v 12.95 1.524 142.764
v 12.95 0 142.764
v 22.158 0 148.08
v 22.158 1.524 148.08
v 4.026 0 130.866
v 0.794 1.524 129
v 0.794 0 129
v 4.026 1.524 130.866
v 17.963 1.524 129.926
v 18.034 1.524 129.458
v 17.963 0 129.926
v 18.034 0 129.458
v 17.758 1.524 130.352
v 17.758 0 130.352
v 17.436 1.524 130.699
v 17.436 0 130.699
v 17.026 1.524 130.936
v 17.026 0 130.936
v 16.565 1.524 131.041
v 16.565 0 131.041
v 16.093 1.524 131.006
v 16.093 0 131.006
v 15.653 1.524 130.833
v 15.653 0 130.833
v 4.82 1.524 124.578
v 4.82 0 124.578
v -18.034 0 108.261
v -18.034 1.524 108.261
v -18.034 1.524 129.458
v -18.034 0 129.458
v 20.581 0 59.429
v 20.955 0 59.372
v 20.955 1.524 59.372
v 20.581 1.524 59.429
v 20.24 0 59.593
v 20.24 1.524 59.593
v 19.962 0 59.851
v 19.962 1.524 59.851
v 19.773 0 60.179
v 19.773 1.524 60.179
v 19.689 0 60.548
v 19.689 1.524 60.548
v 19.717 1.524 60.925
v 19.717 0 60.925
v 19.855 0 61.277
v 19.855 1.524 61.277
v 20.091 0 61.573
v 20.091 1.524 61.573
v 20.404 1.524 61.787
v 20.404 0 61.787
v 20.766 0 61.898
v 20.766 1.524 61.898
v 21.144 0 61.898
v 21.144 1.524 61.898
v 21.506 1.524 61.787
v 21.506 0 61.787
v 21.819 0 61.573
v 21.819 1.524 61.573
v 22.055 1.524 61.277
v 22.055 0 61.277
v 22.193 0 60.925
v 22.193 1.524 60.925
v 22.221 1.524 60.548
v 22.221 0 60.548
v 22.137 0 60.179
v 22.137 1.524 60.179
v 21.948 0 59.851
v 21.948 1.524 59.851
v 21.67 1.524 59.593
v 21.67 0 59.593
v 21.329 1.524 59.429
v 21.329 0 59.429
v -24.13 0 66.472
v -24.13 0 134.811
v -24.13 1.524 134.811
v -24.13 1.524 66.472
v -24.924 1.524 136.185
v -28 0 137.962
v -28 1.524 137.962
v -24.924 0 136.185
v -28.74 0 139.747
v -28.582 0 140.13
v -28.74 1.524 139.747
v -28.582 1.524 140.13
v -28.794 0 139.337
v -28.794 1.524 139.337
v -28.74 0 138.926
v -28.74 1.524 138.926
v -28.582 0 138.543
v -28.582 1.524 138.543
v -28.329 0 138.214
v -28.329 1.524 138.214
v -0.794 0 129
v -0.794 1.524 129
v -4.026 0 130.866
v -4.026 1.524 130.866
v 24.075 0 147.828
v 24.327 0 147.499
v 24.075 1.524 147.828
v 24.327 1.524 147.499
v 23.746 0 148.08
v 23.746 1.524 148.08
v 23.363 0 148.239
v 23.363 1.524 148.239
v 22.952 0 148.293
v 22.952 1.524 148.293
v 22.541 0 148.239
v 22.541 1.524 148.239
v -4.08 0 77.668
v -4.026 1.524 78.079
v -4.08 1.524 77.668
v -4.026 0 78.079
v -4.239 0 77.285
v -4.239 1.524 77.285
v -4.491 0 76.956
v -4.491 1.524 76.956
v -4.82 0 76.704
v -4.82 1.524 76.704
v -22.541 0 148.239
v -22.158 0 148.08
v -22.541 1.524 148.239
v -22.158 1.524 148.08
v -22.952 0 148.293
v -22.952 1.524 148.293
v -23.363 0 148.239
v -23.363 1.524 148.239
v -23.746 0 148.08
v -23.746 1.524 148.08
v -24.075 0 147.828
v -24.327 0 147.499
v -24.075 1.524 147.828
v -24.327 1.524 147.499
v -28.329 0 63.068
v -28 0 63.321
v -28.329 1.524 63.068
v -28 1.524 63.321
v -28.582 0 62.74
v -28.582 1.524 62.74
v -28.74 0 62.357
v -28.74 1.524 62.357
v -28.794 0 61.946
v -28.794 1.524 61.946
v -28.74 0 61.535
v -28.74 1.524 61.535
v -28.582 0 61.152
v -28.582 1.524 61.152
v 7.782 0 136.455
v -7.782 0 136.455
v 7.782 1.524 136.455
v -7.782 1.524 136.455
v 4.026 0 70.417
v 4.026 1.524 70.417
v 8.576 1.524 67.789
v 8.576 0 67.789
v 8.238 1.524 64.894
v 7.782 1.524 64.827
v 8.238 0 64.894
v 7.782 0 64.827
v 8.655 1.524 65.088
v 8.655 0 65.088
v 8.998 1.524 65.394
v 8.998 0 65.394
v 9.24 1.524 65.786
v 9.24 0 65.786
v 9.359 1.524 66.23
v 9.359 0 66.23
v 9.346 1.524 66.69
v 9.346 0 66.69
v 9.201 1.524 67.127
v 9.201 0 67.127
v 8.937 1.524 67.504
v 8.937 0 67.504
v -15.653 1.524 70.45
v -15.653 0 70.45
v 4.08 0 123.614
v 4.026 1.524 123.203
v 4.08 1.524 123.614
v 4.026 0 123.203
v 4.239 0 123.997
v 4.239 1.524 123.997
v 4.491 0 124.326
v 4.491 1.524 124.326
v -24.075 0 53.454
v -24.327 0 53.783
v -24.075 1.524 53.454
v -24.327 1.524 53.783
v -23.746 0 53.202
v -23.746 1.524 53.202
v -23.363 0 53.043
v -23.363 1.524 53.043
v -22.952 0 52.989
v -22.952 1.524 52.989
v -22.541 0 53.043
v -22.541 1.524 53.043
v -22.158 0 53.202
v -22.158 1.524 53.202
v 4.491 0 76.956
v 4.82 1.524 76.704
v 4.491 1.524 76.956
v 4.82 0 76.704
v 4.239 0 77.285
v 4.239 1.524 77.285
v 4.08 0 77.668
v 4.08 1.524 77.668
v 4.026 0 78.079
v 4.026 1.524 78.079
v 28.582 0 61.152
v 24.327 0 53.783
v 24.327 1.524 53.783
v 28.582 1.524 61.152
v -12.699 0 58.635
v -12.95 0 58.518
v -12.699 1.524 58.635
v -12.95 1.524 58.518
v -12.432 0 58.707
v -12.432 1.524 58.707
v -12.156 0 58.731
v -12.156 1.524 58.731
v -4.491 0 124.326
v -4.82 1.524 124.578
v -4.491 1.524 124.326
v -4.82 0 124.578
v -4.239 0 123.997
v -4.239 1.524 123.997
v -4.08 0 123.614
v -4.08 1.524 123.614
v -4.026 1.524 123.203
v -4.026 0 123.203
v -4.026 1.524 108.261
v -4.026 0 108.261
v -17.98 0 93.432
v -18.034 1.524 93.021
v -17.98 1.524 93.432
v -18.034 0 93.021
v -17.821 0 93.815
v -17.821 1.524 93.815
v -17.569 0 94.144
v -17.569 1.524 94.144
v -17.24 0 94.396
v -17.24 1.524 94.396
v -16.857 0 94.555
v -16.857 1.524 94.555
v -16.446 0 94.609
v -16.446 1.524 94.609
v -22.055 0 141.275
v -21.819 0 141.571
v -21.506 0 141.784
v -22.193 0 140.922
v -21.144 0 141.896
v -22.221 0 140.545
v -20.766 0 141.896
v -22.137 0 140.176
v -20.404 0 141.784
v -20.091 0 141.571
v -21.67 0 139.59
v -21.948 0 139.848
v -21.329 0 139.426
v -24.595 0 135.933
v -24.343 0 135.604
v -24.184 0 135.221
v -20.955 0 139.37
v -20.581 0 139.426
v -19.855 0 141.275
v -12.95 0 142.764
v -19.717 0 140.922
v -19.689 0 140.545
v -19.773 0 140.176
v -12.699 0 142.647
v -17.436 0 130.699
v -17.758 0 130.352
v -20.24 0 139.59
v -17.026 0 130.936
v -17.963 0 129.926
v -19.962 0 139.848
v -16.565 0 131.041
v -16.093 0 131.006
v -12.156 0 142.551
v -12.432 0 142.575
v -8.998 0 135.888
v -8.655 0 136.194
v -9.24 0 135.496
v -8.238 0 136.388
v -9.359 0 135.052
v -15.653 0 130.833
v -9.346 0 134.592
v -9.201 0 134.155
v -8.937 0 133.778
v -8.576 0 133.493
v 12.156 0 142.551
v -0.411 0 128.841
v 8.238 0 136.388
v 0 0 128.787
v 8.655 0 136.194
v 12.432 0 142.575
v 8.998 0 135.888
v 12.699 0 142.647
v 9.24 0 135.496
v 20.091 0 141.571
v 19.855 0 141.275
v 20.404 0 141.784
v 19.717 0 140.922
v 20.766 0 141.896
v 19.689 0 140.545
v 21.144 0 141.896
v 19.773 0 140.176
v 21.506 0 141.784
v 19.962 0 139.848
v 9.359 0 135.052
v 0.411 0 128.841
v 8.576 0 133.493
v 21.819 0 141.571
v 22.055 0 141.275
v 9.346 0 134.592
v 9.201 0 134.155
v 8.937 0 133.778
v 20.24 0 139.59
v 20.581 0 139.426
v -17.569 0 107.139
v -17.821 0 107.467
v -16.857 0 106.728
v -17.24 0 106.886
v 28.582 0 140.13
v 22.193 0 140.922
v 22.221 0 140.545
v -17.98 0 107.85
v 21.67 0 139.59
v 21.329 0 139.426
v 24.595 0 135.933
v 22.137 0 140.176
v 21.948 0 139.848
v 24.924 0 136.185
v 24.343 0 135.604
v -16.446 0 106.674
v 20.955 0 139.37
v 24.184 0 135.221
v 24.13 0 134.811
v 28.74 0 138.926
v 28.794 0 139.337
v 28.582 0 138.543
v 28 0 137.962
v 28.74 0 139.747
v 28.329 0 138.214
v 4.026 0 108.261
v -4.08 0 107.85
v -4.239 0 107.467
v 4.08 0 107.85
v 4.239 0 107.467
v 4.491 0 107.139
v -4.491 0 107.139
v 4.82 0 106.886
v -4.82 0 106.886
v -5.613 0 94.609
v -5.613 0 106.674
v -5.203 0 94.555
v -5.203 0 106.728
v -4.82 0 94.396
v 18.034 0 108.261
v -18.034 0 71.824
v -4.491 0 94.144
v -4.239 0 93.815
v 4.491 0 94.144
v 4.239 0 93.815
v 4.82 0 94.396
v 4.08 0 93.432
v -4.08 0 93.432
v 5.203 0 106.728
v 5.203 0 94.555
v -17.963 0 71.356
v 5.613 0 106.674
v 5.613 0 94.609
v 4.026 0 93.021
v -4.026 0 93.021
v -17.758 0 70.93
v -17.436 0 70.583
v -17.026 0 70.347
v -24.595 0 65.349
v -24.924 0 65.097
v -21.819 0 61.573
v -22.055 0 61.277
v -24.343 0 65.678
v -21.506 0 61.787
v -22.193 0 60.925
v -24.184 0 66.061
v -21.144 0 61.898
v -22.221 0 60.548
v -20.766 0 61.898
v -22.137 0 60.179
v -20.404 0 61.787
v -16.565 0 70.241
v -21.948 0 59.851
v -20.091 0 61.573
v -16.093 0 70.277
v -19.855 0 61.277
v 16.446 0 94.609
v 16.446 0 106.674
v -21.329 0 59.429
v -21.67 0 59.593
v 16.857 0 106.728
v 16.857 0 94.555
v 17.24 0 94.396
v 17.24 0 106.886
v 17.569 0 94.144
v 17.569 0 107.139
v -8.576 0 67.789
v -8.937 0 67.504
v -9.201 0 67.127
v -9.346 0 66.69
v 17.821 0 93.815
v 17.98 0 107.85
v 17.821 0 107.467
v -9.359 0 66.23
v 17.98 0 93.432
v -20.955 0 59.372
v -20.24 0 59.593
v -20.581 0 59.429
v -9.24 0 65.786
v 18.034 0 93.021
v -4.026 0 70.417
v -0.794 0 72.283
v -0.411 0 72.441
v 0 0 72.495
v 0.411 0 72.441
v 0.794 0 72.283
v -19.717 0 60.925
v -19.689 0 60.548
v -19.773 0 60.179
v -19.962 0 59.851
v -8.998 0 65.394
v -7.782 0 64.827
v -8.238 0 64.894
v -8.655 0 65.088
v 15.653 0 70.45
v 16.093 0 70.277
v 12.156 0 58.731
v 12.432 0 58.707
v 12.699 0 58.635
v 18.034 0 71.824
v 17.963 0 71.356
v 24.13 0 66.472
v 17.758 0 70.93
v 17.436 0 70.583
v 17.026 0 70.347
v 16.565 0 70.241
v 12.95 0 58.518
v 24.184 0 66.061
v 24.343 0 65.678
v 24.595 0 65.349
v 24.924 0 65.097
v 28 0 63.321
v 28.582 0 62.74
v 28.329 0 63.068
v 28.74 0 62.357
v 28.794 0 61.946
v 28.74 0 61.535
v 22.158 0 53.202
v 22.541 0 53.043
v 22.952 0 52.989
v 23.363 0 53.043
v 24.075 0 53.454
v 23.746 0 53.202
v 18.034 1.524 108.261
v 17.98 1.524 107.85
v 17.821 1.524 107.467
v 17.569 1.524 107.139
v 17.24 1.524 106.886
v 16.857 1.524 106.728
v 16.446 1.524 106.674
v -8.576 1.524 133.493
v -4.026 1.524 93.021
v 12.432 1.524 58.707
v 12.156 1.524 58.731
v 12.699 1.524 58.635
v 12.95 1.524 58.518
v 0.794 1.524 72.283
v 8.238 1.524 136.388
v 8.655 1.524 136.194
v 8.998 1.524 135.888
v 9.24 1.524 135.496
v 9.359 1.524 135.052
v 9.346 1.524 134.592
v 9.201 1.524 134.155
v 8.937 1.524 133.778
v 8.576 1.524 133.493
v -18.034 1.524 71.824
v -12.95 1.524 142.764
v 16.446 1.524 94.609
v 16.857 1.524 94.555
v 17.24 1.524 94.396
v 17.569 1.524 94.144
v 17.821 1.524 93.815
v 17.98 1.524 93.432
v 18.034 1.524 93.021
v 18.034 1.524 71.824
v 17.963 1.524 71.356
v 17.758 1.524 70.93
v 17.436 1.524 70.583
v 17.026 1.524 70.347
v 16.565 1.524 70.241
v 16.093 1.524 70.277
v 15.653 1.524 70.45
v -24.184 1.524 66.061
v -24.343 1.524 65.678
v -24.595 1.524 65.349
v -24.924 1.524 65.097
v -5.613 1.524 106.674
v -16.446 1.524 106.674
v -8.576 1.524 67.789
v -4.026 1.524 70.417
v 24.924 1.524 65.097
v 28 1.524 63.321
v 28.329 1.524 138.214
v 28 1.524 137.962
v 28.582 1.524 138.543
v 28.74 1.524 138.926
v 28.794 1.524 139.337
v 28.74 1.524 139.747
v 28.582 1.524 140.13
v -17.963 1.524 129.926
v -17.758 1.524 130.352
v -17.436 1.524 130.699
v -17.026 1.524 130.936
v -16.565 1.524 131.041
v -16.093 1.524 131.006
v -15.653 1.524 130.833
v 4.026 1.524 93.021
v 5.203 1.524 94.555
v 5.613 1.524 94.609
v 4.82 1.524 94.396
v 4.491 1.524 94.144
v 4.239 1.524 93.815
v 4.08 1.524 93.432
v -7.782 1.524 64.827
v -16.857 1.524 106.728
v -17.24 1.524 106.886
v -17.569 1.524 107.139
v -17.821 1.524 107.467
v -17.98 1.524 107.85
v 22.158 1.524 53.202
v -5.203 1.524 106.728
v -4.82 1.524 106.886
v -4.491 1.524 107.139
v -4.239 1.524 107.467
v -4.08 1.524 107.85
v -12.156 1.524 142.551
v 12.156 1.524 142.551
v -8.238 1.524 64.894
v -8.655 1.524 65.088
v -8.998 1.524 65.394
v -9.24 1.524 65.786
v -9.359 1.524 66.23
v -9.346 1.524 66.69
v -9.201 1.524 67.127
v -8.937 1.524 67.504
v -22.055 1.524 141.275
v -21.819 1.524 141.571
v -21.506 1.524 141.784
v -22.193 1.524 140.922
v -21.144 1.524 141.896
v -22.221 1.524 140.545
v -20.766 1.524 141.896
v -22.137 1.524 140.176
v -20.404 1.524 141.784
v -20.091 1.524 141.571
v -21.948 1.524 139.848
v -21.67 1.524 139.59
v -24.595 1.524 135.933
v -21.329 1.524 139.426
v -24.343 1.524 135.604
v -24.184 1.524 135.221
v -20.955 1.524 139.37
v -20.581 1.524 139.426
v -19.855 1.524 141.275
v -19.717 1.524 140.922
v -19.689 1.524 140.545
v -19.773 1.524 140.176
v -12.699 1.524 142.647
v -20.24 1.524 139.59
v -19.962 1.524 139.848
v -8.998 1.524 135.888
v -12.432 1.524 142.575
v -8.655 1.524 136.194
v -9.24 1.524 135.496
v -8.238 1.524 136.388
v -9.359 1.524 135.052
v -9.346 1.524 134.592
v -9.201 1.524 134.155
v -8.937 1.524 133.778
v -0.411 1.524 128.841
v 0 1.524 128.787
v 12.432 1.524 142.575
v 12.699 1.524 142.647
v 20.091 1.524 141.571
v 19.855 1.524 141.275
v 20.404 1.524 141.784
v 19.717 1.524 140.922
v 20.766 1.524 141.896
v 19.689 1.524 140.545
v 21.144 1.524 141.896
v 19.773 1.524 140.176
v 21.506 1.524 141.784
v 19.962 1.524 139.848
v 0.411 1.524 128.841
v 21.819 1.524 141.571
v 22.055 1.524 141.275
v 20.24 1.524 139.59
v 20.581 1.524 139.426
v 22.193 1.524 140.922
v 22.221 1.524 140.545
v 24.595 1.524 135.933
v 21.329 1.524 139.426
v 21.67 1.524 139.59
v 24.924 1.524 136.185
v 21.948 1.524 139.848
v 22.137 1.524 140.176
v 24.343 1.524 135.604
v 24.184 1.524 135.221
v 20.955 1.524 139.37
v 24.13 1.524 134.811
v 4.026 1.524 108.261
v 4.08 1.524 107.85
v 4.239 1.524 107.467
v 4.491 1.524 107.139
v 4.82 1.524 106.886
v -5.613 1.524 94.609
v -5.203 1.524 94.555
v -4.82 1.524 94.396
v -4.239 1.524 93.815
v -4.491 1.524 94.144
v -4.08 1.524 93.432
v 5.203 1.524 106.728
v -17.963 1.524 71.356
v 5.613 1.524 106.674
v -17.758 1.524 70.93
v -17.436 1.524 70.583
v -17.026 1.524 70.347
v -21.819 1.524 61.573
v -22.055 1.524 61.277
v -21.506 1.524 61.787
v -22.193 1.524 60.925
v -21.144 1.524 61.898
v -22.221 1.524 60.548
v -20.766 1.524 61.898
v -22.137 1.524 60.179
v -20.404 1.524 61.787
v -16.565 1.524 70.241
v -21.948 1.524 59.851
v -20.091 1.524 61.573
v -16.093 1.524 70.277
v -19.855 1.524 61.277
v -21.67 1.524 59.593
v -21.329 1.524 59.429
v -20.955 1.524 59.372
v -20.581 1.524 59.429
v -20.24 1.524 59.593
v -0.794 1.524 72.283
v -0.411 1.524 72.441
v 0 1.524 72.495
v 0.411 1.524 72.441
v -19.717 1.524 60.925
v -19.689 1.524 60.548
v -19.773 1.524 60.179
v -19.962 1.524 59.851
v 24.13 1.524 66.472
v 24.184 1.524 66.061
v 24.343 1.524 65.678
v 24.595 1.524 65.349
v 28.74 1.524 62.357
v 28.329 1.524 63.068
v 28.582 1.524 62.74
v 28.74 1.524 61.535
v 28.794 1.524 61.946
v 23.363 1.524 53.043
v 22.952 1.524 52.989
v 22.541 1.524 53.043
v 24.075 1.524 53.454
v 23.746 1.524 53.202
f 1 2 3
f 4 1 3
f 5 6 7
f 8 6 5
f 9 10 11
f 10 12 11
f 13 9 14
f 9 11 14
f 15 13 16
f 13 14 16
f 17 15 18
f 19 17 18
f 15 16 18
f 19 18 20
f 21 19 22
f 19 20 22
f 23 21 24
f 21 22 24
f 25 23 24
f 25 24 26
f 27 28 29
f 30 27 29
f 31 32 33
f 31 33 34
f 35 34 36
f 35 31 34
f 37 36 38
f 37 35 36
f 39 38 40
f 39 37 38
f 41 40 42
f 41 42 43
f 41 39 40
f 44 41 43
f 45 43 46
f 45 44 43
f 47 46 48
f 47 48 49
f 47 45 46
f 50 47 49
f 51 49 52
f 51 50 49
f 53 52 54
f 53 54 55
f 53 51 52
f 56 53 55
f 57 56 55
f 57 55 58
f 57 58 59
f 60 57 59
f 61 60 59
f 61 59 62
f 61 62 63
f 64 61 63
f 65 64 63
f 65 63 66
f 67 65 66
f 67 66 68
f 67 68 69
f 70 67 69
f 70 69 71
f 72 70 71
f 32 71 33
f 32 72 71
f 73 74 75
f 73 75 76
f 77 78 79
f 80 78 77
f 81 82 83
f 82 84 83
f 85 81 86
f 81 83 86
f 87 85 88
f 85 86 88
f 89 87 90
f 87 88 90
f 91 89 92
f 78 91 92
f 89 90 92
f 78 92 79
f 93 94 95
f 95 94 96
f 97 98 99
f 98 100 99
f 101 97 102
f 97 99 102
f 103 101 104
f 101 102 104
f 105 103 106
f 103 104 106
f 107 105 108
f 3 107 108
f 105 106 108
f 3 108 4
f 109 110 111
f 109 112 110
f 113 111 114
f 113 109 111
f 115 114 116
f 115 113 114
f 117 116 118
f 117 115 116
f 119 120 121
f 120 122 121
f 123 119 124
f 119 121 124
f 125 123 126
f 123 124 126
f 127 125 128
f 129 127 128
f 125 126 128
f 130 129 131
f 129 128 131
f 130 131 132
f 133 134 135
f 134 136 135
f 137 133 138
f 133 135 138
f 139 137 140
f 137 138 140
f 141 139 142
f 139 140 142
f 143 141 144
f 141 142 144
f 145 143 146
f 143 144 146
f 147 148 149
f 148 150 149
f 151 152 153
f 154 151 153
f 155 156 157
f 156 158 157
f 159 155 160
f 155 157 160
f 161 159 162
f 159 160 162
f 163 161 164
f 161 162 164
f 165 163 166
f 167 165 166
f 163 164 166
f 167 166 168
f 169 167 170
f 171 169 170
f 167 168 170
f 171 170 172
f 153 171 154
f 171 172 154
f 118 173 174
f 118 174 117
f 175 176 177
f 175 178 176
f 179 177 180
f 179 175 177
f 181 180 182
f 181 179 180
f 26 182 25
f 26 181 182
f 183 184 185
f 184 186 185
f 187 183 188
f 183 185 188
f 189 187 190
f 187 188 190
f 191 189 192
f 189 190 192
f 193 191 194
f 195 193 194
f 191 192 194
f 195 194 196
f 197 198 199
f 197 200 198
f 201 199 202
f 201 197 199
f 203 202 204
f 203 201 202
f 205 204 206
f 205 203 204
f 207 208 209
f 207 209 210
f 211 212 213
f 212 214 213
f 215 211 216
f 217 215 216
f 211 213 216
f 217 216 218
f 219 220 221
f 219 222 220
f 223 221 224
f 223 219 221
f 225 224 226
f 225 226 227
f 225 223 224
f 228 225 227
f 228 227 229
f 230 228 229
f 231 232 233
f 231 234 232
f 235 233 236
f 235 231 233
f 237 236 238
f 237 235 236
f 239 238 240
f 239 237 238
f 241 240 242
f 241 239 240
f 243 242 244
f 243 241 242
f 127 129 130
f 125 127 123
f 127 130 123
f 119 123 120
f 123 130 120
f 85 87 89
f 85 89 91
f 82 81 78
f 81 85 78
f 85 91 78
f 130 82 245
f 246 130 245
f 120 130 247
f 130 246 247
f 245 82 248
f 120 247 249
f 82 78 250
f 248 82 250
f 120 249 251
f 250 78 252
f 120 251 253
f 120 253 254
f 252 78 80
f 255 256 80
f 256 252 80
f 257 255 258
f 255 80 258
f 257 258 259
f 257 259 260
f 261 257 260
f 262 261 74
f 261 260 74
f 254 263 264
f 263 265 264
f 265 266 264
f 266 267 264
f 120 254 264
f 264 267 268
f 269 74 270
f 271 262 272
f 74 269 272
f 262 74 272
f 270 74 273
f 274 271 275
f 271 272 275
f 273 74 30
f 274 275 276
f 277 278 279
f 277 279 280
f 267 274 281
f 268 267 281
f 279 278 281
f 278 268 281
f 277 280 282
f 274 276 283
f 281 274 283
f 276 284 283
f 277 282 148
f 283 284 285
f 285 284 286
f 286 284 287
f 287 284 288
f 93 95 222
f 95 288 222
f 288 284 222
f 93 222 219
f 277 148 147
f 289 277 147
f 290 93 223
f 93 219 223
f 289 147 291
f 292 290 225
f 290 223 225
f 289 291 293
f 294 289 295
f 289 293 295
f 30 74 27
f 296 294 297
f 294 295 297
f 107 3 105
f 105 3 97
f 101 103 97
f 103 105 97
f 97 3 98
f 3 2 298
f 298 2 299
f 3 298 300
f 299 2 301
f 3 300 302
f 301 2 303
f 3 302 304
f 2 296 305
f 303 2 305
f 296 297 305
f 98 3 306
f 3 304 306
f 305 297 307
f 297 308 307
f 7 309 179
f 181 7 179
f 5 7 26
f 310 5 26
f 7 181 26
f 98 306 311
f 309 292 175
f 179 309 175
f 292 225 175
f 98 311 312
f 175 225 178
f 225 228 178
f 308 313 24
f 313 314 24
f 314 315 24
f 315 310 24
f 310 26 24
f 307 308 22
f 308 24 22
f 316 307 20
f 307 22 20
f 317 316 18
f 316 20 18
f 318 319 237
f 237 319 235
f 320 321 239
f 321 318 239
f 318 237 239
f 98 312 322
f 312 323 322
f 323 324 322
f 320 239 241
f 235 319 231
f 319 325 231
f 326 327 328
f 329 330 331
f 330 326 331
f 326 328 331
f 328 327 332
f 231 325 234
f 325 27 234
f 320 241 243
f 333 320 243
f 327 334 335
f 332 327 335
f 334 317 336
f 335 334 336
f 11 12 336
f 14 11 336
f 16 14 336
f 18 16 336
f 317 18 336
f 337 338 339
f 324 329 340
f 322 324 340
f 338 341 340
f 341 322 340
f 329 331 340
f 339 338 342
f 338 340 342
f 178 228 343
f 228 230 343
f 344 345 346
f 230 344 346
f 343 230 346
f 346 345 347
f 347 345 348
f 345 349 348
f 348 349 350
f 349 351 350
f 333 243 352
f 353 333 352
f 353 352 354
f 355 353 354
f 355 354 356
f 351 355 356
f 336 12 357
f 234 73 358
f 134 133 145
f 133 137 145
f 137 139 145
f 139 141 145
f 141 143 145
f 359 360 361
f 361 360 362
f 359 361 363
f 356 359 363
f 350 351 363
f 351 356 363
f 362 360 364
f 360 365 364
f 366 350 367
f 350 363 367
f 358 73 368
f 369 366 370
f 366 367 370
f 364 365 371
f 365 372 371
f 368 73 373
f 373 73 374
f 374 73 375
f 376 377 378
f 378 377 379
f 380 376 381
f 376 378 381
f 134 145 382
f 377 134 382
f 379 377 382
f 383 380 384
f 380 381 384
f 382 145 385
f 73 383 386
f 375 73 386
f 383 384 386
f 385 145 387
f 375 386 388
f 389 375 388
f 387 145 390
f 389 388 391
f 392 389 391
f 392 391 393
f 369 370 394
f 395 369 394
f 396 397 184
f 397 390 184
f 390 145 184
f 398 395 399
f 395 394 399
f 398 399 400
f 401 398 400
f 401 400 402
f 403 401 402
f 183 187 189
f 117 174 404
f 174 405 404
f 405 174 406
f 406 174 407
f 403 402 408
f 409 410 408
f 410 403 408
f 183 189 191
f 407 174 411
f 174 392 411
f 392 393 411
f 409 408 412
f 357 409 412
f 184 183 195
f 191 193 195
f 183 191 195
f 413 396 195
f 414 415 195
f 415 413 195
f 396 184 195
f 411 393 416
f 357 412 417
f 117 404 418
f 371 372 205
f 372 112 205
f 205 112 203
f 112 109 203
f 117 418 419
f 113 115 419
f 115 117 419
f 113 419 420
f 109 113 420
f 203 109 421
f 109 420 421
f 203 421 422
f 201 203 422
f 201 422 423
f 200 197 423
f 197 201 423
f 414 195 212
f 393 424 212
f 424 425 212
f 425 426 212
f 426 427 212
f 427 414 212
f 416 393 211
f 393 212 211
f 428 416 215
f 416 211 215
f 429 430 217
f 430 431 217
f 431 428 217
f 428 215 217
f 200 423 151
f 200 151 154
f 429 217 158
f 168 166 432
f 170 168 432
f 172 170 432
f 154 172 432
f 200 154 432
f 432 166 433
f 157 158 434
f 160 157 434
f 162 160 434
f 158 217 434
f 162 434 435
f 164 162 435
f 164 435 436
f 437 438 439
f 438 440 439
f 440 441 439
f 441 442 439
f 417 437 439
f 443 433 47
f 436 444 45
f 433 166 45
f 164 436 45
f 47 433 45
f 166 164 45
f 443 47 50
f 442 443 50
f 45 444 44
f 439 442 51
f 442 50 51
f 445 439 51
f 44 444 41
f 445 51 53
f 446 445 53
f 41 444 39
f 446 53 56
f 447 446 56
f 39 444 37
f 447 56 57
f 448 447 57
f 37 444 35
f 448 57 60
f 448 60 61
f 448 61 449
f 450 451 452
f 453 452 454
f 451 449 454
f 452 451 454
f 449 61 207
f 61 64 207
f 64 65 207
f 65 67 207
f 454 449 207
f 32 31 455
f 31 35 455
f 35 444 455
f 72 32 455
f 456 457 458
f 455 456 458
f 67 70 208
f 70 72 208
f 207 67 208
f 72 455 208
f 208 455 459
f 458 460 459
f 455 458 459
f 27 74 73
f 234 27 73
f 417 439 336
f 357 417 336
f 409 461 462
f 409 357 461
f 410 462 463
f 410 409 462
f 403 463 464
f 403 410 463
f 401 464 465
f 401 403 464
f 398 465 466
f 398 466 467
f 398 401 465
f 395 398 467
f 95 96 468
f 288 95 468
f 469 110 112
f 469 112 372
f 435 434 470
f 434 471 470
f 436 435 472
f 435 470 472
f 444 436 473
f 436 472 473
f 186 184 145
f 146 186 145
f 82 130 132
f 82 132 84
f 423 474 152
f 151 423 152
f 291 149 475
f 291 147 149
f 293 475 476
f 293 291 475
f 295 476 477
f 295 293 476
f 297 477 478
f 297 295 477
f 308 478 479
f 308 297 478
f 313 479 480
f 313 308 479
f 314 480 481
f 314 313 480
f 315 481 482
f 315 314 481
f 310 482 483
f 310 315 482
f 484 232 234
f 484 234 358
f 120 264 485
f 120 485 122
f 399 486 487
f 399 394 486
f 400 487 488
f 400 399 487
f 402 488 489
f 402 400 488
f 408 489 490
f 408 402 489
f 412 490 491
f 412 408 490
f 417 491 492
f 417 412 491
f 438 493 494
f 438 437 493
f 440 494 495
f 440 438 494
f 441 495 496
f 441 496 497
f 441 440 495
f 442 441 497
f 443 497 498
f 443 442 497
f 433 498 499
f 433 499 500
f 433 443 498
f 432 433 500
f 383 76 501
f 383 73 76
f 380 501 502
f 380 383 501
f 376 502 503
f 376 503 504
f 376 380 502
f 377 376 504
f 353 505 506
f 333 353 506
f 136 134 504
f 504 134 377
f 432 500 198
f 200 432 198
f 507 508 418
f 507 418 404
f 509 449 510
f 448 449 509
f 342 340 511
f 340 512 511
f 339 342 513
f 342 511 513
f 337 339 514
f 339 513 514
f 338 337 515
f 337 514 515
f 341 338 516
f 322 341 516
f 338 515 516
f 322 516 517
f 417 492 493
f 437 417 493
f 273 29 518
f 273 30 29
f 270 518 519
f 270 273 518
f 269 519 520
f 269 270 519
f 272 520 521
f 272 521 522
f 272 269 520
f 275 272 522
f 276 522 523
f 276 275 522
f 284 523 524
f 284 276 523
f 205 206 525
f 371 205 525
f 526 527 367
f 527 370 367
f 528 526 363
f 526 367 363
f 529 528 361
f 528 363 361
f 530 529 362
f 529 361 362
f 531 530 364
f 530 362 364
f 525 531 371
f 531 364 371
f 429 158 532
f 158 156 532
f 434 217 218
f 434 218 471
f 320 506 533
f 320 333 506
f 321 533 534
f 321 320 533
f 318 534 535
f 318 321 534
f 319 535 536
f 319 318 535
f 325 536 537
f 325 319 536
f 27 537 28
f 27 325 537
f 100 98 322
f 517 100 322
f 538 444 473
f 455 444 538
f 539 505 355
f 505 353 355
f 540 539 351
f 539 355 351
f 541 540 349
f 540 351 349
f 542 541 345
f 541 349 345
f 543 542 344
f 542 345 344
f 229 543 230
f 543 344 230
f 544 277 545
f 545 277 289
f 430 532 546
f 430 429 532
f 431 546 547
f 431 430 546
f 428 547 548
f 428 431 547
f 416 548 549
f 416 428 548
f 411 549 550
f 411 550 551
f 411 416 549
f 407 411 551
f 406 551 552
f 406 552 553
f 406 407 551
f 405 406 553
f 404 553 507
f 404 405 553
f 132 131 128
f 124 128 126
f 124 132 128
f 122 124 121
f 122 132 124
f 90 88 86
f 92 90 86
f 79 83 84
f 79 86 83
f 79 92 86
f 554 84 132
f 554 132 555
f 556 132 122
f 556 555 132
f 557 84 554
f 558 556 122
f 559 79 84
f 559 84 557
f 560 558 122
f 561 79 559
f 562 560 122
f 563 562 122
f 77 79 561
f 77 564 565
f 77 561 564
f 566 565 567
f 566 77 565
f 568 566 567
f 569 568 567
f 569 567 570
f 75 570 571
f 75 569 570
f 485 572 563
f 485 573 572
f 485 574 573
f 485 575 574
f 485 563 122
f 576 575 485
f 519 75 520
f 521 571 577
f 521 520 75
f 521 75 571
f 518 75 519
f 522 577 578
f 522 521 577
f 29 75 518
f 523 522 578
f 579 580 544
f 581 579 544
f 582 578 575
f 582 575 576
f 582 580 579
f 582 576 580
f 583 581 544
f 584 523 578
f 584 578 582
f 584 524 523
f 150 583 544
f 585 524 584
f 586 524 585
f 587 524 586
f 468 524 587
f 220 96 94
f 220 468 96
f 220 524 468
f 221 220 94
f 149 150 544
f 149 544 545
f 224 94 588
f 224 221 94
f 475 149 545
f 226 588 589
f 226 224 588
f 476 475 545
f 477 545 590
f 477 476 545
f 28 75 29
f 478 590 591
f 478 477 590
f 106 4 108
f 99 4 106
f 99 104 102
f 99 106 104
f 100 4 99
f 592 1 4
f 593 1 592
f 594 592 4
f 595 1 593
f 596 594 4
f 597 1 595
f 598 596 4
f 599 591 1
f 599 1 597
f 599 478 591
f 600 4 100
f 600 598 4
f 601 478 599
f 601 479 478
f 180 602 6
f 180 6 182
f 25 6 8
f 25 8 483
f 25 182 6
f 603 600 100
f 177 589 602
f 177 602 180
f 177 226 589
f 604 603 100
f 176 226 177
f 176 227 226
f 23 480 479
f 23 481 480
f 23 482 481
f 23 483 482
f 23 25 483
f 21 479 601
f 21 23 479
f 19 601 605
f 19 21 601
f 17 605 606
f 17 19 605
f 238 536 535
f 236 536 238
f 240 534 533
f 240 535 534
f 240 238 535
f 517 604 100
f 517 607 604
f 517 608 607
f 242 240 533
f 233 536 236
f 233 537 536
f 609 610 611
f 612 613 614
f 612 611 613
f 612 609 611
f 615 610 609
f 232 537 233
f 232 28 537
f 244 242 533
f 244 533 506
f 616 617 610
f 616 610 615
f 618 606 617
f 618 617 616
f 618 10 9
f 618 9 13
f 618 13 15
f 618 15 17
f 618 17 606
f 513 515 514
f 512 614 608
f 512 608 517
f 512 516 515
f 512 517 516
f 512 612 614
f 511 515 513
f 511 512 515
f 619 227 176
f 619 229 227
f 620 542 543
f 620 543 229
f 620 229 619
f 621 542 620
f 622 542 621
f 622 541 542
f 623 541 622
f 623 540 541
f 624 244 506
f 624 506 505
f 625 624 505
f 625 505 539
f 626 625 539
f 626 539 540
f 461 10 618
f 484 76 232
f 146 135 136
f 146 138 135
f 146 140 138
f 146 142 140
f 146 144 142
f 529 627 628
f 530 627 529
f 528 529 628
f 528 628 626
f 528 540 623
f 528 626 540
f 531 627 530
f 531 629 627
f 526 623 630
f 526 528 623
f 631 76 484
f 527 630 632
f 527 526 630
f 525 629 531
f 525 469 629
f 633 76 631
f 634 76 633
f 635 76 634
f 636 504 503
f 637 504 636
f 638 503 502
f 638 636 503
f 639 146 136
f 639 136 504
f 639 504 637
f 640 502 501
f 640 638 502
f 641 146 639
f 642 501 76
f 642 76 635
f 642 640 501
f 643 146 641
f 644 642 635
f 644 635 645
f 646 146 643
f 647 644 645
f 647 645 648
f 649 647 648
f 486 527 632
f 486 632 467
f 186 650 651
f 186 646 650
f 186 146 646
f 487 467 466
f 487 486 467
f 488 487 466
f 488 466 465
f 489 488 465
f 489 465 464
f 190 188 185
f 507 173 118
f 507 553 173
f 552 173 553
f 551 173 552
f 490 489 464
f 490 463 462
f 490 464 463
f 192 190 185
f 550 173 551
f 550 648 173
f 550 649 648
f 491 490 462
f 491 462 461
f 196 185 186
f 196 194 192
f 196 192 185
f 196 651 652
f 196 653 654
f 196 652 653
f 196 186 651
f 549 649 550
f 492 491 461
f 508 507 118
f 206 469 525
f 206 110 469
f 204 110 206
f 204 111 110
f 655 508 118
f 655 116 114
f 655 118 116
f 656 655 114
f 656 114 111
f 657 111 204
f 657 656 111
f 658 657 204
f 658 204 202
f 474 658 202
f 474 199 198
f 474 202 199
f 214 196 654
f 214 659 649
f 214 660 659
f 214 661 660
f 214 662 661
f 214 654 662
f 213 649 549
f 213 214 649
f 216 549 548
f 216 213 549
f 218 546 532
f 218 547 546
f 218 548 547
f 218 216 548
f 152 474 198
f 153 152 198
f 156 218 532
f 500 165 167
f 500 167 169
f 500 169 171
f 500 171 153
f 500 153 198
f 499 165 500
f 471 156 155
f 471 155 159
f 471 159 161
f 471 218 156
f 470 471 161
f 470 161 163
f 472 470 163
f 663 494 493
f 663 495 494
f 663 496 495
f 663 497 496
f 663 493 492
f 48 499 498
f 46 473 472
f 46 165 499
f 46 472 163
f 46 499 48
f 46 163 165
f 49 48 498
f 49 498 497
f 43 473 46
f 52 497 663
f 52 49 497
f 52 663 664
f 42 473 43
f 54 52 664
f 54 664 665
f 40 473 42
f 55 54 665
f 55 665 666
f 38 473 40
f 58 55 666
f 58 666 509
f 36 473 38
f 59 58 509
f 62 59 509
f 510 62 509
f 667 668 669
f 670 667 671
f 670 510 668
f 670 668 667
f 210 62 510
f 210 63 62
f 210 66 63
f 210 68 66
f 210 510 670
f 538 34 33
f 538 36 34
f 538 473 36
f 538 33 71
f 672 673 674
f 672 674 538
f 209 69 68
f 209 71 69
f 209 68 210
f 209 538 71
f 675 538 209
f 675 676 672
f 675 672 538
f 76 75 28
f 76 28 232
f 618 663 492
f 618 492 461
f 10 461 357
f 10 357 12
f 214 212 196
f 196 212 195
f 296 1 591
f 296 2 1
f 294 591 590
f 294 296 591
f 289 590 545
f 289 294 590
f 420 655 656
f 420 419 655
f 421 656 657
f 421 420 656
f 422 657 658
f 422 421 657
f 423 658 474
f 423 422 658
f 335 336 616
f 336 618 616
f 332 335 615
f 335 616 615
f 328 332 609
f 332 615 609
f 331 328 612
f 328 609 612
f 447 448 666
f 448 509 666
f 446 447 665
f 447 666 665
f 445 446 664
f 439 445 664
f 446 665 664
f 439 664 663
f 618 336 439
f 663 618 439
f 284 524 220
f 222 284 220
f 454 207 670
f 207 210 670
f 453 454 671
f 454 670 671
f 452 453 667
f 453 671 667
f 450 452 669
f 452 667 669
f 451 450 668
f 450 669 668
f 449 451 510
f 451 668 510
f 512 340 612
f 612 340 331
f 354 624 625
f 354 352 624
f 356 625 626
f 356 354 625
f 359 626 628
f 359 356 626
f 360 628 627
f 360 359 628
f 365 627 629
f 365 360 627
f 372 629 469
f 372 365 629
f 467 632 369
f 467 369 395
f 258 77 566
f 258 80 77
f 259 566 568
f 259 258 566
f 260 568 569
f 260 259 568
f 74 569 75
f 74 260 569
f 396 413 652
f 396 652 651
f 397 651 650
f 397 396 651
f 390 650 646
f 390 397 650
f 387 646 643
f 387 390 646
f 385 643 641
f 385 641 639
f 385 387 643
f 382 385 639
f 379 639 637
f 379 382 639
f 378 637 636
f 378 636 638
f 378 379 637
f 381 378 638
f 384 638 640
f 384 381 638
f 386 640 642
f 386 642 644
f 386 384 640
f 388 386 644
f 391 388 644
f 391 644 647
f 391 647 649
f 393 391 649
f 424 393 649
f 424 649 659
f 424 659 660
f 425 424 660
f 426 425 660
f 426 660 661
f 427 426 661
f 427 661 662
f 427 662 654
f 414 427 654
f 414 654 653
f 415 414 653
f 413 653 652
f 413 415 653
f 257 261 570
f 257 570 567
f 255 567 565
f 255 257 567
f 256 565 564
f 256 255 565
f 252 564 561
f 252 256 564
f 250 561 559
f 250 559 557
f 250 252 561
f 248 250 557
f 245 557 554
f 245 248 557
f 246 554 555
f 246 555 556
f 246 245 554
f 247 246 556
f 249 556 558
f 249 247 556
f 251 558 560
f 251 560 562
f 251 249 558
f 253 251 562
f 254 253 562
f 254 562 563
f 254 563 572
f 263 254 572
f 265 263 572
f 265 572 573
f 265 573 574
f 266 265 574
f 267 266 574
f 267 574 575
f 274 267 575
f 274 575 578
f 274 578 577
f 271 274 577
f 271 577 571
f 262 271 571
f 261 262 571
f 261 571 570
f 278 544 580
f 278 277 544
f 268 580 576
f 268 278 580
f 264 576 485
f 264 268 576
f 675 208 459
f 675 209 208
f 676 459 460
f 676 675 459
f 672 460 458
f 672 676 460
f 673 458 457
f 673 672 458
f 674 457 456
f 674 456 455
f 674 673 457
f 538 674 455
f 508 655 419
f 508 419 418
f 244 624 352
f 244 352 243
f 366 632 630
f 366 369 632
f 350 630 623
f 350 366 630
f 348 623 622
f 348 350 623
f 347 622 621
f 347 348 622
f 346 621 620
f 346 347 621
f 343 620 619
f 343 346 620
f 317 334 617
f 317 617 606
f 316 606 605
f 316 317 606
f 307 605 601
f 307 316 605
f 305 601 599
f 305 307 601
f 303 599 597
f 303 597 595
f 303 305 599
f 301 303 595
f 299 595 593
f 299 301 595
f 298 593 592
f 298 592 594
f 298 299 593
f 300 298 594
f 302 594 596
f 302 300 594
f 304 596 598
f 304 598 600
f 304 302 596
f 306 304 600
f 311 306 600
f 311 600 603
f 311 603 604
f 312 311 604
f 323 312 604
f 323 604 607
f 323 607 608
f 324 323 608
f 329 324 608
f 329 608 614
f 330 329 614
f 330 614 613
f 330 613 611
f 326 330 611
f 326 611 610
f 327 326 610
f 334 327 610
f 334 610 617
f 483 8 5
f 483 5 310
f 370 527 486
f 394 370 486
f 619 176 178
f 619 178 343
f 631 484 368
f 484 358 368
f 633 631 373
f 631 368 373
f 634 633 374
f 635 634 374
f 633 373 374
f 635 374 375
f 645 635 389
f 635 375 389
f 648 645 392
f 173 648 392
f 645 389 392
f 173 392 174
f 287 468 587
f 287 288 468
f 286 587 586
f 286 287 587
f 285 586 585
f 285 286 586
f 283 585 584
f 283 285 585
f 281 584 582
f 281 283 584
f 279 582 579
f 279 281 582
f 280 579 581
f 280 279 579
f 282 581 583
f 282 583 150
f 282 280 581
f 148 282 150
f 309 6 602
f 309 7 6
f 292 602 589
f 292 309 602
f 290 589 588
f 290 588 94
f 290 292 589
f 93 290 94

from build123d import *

# Parameters (mm, degrees)
SKETCH2_W               = 48.26
SKETCH2_H               = 83.82
SKETCH2_R               = 1.27
BOSS_EXTRUDE1_DEPTH     = 1.524
SKETCH3_R               = 1.27
BOSS_EXTRUDE2_DEPTH     = 1.524
MIRROR2_COPY_1_SKETCH_R = 1.27
MIRROR2_COPY_1_DEPTH    = 1.524
CUT_EXTRUDE1_DEPTH      = 1.524
MIRROR4_COPY_1_DEPTH    = 1.524
FILLET1_R               = 1.5875


with BuildPart() as part:
    # Sketch2 → Boss-Extrude1 (new body)
    with BuildSketch(Plane(origin=(0, 0, 0), x_dir=(1, 0, 0), z_dir=(0, 1, 0))):
        with Locations((0, -100.64115)):
            Rectangle(SKETCH2_W, SKETCH2_H)
        with Locations(Location((20.955, -140.6398, 0), (0, 0, 90))):
            Circle(SKETCH2_R, mode=Mode.SUBTRACT)
        with Locations(Location((-20.955, -140.6398, 0), (0, 0, 90))):
            Circle(SKETCH2_R, mode=Mode.SUBTRACT)
        with Locations(Location((20.955, -60.6425, 0), (0, 0, 90))):
            Circle(SKETCH2_R, mode=Mode.SUBTRACT)
        with Locations(Location((-20.955, -60.6425, 0), (0, 0, 90))):
            Circle(SKETCH2_R, mode=Mode.SUBTRACT)
    extrude(amount=BOSS_EXTRUDE1_DEPTH)

    # Sketch3 → Boss-Extrude2 (add, through all)
    with BuildSketch(Plane(origin=(0, 0, 0), x_dir=(1, 0, 0), z_dir=(0, 1, 0))):
        Polygon((-2.921, -67.681554482), (23.533261314, -52.408179591), (29.375261314, -62.526820409), (2.921, -77.8001953), align=None)
        with Locations(Location((20.955, -60.6425, 0), (0, 0, 90))):
            Circle(SKETCH3_R, mode=Mode.SUBTRACT)
    boss_extrude2 = extrude(amount=BOSS_EXTRUDE2_DEPTH)

    # Mirror1: Boss-Extrude2 across plane
    add(boss_extrude2.mirror(Plane.XY.offset(100.64115)))

    # Mirror2: Boss-Extrude2 across plane
    add(boss_extrude2.mirror(Plane(origin=(0, 0, 0), x_dir=(0, 0, 1), z_dir=(1, 0, 0))))

    # Mirror2 copy 1 sketch → Mirror2 copy 1 (add, through all)
    with BuildSketch(Plane(origin=(0, 0, 201.2823), x_dir=(-1, 0, 0), z_dir=(0, 1, 0))):
        Polygon((-2.921, -67.681554482), (23.533261314, -52.408179591), (29.375261314, -62.526820409), (2.921, -77.8001953), align=None)
        with Locations(Location((20.955, -60.6425, 0), (0, 0, 90))):
            Circle(MIRROR2_COPY_1_SKETCH_R, mode=Mode.SUBTRACT)
    extrude(amount=MIRROR2_COPY_1_DEPTH)

    # Sketch4 → Cut-Extrude1 (cut)
    with BuildSketch(Plane(origin=(0, 1.524, 0), x_dir=(1, 0, 0), z_dir=(0, 1, 0))):
        Polygon((4.0259, -77.162280987), (4.0259, -94.60865), (18.034, -94.60865), (18.034, -69.074700682), align=None)
        Polygon((4.0259, -64.82715), (4.0259, -70.416520442), (13.706973588, -64.82715), align=None)
        Polygon((4.0259, -64.82715), (0, -64.82715), (0, -72.740874891), (4.0259, -70.416520442), align=None)
    cut_extrude1 = extrude(amount=-CUT_EXTRUDE1_DEPTH, mode=Mode.SUBTRACT)

    # Mirror3: Cut-Extrude1 across plane
    add(cut_extrude1.mirror(Plane(origin=(0, 0, 0), x_dir=(0, 0, 1), z_dir=(1, 0, 0))), mode=Mode.SUBTRACT)

    # Mirror4: Cut-Extrude1 across plane
    add(cut_extrude1.mirror(Plane.XY.offset(100.64115)), mode=Mode.SUBTRACT)

    # Mirror4 copy 1 sketch → Mirror4 copy 1 (cut)
    with BuildSketch(Plane(origin=(0, 1.524, 201.2823), x_dir=(-1, 0, 0), z_dir=(0, 1, 0))):
        Polygon((4.0259, -77.162280987), (4.0259, -94.60865), (18.034, -94.60865), (18.034, -69.074700682), align=None)
        Polygon((4.0259, -64.82715), (4.0259, -70.416520442), (13.706973588, -64.82715), align=None)
        Polygon((4.0259, -64.82715), (0, -64.82715), (0, -72.740874891), (4.0259, -70.416520442), align=None)
    extrude(amount=-MIRROR4_COPY_1_DEPTH, mode=Mode.SUBTRACT)

    # Fillet1
    fillet1_edges = [part.edges().sort_by_distance(p)[0] for p in [
        (-29.375261314, 0.762, 138.755479591),
        (18.034, 0.762, 69.074700682),
        (18.034, 0.762, 94.60865),
        (4.0259, 0.762, 94.60865),
        (4.0259, 0.762, 77.162280987),
        (13.706973588, 0.762, 64.82715),
        (0, 0.762, 72.740874891),
        (-18.034, 0.762, 94.60865),
        (-18.034, 0.762, 69.074700682),
        (-4.0259, 0.762, 77.162280987),
        (-4.0259, 0.762, 94.60865),
        (-13.706973588, 0.762, 64.82715),
        (-18.034, 0.762, 132.207599318),
        (-18.034, 0.762, 106.67365),
        (-4.0259, 0.762, 106.67365),
        (-4.0259, 0.762, 124.120019013),
        (-13.706973588, 0.762, 136.45515),
        (0, 0.762, 128.541425109),
        (18.034, 0.762, 106.67365),
        (18.034, 0.762, 132.207599318),
        (4.0259, 0.762, 124.120019013),
        (4.0259, 0.762, 106.67365),
        (13.706973588, 0.762, 136.45515),
        (24.13, 0.762, 65.555173441),
        (12.581555311, 0.762, 58.73115),
        (29.375261314, 0.762, 62.526820409),
        (23.533261314, 0.762, 52.408179591),
        (12.581555311, 0.762, 142.55115),
        (23.533261314, 0.762, 148.874120409),
        (24.13, 0.762, 135.727126559),
        (29.375261314, 0.762, 138.755479591),
        (-29.375261314, 0.762, 62.526820409),
        (-12.581555311, 0.762, 58.73115),
        (-23.533261314, 0.762, 52.408179591),
        (-24.13, 0.762, 65.555173441),
        (-24.13, 0.762, 135.727126559),
        (-12.581555311, 0.762, 142.55115),
        (-23.533261314, 0.762, 148.874120409),
    ]]
    fillet(fillet1_edges, radius=FILLET1_R)


solid = part.part
